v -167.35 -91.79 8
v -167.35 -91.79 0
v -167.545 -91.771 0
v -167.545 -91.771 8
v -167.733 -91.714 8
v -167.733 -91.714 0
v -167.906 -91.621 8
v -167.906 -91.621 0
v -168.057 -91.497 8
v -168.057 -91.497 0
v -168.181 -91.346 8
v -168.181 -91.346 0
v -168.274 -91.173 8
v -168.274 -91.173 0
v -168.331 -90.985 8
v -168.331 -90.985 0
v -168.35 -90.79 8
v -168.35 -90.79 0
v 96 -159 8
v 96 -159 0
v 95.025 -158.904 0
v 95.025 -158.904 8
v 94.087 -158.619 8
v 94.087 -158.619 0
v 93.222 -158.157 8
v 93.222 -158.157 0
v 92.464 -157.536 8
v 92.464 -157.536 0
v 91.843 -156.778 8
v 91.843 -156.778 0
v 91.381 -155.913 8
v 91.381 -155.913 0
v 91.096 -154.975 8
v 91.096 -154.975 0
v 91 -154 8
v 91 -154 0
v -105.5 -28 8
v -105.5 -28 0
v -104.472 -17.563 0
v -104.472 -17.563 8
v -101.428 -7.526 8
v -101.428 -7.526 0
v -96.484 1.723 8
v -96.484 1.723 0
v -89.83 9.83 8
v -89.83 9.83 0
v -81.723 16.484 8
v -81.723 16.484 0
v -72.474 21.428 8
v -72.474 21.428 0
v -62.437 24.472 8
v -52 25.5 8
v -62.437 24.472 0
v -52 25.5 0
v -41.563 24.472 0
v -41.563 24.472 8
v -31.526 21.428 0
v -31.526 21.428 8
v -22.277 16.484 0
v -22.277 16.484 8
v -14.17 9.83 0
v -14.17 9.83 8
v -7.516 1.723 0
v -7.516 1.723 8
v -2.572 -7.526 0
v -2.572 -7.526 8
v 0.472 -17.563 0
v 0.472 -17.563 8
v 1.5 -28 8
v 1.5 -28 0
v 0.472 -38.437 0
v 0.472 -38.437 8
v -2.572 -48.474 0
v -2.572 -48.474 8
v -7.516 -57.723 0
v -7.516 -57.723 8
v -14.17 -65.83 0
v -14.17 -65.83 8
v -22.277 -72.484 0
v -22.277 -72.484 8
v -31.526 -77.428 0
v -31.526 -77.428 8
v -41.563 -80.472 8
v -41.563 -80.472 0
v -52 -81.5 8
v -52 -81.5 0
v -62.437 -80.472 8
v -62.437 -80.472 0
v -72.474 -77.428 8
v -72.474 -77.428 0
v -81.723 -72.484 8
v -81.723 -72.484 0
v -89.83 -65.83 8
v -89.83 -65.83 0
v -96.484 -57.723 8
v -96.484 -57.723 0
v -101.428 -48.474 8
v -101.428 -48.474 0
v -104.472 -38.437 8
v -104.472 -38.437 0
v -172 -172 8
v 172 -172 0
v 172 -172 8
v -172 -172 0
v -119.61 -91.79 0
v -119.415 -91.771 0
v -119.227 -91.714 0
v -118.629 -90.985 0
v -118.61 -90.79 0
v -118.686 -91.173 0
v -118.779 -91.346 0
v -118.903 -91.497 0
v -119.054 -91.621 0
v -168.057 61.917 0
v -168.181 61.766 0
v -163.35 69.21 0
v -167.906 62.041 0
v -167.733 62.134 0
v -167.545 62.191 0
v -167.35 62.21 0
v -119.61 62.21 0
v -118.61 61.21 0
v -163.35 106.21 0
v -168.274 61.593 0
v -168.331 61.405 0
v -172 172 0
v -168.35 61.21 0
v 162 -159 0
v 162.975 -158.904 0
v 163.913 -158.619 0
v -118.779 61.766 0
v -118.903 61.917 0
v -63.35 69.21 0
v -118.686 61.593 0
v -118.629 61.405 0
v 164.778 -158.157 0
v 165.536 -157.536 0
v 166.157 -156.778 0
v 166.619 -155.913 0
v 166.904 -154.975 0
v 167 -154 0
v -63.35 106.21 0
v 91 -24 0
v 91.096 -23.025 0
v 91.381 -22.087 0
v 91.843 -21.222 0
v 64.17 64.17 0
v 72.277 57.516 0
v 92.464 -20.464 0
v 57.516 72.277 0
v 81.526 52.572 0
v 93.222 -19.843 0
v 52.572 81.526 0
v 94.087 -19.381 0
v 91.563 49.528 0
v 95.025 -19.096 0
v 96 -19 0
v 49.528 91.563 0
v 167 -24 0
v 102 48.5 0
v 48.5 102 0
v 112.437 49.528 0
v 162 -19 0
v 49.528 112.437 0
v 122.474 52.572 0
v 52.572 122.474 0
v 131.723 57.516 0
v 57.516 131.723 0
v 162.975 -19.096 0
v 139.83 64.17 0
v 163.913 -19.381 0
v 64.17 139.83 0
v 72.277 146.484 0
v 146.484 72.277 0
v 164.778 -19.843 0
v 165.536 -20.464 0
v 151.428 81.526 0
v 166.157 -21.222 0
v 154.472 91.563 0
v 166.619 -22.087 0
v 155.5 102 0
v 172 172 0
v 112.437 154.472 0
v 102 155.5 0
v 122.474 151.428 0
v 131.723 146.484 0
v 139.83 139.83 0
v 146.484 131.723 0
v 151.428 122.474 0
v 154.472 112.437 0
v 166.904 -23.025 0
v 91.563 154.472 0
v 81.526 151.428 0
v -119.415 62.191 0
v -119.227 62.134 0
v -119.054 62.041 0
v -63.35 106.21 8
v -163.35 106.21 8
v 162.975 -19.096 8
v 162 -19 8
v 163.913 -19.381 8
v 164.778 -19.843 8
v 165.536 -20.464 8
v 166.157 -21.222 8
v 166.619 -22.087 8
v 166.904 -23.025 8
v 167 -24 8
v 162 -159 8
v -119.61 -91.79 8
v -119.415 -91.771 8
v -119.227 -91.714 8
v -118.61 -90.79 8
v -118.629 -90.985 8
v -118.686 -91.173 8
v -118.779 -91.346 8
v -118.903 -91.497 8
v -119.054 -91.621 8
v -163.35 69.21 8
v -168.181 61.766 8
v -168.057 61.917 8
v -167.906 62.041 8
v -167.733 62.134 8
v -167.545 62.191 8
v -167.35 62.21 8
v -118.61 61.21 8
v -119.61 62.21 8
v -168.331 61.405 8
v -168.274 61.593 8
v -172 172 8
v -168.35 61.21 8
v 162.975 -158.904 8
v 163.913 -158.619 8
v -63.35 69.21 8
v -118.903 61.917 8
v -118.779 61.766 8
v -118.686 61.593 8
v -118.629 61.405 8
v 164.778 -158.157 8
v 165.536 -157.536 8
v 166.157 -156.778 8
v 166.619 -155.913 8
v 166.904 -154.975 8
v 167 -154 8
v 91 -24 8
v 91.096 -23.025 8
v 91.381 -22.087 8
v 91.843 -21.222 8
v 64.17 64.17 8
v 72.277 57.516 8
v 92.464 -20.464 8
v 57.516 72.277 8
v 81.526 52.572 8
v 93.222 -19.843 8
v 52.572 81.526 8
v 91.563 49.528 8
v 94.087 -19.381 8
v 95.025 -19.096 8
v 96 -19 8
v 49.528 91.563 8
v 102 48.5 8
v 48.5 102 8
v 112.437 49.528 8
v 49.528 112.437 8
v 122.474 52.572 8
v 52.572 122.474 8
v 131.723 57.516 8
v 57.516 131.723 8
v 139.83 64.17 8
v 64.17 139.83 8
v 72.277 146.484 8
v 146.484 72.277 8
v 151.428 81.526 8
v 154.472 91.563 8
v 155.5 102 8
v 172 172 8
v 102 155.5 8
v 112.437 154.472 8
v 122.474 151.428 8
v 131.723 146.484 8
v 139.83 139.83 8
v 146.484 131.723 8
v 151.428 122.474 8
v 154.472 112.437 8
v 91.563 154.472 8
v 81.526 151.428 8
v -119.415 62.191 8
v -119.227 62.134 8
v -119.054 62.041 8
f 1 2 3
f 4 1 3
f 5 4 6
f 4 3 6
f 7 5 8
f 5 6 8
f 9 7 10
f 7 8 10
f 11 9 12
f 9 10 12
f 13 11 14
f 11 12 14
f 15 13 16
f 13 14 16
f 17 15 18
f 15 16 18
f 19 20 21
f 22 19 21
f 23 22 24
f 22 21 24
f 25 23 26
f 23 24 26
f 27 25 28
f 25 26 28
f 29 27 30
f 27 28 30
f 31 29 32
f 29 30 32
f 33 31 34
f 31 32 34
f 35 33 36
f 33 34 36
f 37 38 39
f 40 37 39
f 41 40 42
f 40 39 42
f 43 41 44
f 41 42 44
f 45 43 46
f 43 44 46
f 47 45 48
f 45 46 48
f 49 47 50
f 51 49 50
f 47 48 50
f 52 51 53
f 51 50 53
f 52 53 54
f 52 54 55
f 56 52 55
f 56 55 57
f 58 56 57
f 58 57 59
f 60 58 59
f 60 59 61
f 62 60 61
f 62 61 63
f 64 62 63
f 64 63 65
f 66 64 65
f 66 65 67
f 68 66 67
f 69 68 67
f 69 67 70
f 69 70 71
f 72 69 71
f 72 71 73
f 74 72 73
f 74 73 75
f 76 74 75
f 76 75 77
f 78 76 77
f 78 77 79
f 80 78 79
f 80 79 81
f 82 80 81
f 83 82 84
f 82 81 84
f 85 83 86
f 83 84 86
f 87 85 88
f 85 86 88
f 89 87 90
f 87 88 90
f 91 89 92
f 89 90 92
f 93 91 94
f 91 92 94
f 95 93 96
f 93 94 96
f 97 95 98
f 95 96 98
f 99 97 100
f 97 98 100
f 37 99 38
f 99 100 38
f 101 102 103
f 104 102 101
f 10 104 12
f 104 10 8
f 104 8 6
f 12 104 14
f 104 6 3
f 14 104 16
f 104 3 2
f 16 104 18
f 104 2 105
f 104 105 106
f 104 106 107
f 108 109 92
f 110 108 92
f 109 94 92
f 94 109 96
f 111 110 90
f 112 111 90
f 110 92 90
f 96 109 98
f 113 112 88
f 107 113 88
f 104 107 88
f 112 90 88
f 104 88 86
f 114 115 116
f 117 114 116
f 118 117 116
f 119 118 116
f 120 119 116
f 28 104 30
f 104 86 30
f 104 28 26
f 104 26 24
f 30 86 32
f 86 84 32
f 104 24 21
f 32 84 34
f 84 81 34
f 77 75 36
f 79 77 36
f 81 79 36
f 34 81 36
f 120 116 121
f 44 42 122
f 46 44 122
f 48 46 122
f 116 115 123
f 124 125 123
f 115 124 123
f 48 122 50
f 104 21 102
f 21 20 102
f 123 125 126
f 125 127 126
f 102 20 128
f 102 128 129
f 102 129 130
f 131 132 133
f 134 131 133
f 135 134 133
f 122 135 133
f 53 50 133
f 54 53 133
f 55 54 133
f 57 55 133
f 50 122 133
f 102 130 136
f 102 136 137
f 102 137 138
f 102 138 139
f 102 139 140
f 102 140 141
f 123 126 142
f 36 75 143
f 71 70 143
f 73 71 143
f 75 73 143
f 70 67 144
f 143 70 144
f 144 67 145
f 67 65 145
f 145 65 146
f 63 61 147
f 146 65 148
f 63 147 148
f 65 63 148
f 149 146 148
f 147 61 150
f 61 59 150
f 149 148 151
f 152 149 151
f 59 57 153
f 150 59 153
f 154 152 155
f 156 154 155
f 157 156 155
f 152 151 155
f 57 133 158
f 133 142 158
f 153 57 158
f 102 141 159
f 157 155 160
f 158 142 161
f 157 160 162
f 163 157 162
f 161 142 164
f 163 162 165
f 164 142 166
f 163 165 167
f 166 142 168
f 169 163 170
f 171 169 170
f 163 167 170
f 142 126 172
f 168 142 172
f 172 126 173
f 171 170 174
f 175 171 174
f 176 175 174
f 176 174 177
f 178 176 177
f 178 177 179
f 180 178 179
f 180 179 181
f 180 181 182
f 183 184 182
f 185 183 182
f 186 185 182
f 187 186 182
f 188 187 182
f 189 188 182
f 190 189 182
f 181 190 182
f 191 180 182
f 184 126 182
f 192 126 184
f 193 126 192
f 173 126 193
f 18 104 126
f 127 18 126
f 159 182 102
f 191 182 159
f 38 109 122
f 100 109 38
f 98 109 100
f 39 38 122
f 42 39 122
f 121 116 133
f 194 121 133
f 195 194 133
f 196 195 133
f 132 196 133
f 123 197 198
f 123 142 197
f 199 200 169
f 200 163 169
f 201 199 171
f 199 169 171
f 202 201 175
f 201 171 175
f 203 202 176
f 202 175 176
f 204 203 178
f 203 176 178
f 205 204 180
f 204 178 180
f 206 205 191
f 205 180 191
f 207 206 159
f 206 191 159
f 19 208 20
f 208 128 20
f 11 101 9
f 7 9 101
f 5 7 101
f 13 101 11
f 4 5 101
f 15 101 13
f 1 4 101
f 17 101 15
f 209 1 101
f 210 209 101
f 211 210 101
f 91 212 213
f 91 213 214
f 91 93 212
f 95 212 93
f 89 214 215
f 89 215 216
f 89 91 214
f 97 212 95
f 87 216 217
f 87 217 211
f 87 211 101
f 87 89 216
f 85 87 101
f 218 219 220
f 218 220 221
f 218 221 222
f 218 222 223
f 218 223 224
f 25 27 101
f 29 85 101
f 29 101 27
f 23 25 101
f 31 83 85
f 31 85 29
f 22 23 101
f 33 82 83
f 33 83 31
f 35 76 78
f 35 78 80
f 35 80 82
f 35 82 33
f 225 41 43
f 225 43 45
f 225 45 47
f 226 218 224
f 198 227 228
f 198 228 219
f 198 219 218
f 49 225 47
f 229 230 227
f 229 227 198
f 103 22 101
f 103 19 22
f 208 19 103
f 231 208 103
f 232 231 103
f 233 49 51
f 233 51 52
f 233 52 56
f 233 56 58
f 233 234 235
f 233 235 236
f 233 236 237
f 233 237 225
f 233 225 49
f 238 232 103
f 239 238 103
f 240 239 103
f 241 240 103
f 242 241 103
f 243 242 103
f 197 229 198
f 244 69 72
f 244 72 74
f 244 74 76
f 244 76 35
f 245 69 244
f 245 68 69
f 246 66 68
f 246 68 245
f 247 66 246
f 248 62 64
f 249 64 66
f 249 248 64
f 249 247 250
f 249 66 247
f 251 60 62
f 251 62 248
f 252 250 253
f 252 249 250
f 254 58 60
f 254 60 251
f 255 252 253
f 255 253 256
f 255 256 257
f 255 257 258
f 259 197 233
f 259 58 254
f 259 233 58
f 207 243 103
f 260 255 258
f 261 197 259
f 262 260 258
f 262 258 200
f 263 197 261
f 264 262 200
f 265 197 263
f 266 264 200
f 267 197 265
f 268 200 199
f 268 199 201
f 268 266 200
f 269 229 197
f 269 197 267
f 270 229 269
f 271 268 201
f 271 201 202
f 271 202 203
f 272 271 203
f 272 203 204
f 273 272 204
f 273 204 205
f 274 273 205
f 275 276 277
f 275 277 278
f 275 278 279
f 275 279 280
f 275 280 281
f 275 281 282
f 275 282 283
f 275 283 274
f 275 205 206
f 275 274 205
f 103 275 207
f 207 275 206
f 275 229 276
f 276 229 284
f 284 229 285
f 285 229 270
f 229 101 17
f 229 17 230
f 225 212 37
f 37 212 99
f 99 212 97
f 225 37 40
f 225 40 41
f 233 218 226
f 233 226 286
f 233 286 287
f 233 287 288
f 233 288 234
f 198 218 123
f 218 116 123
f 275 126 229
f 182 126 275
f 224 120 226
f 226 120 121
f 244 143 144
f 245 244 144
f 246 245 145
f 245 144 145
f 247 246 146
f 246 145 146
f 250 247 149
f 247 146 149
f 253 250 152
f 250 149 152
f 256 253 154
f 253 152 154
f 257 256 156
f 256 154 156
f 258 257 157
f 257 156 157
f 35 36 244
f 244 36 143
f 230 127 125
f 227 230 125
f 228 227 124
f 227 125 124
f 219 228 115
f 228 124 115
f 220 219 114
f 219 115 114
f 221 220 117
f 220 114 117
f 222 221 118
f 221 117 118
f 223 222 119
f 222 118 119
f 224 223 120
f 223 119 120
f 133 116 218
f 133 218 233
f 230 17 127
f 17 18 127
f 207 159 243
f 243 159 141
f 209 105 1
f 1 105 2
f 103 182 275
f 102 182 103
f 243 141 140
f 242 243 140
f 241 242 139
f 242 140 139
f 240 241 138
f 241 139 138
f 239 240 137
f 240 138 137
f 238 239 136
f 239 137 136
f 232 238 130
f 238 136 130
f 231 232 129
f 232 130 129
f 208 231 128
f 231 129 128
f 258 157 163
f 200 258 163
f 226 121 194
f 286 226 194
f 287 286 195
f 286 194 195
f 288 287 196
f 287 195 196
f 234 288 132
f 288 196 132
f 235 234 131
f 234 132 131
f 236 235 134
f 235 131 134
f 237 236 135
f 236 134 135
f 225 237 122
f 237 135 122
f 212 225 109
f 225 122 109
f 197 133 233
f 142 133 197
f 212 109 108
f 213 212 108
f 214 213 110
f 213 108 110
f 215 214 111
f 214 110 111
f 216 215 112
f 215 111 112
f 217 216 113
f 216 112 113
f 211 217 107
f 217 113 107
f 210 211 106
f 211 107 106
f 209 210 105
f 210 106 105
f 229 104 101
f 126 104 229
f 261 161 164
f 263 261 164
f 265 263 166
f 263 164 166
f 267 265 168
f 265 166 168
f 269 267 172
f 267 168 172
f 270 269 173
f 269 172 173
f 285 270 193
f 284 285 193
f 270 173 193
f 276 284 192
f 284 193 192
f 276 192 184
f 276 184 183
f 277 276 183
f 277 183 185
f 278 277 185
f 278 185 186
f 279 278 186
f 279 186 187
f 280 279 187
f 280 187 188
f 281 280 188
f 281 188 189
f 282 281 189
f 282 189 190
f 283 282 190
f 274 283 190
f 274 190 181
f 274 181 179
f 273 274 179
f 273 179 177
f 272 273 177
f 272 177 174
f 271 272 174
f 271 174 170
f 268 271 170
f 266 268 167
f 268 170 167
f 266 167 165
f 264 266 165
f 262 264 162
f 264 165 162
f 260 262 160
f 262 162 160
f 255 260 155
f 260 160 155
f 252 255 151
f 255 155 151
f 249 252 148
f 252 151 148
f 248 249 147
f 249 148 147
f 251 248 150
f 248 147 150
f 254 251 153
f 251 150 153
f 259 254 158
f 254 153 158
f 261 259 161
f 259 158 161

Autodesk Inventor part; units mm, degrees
ref_plane "YZ Plane" through (0, 0, 0) normal (1, 0, 0) x (0, 1, 0)
ref_plane "XZ Plane" through (0, 0, 0) normal (0, 1, 0) x (-1, 0, 0)
ref_plane "XY Plane" through (0, 0, 0) normal (0, 0, 1) x (1, 0, 0)
sketch "Sketch1" plane through (0, 0, 0) normal (0, 0, 1) x (1, 0, 0)
  line L0 (-172, 172) -> (172, 172)
  line L1 (172, 172) -> (172, -172)
  line L2 (172, -172) -> (-172, -172)
  line L3 (-172, -172) -> (-172, 172)
  point P0 (0, 0)
  dimension "d0" = 344
  dimension "d1" = 344
  dimension "d2" = 172
  dimension "d3" = 172
extrude "Extrusion1" add sketch "Sketch1" along normal blind 8
sketch "Sketch3" plane through (0, 0, 0) normal (0, 0, -1) x (-1, 0, 0)
  circle A0 centre (-102, 102) radius 53.5
  circle A1 centre (52, -28) radius 53.5
  circle A2 centre (52, -28) radius 12.5 construction
  circle A3 centre (-102, 102) radius 12.5 construction
  point P0 (0, 0)
  dimension "d18" = 107
  dimension "d19" = 107
extrude "Extrusion2" cut sketch "Sketch3" against normal through all
sketch "Sketch4" plane through (0, 0, 0) normal (0, 0, -1) x (-1, 0, 0)
  line L0 (118.61, 61.21) -> (118.61, -90.79) projected
  line L1 (119.61, -91.79) -> (167.35, -91.79) projected
  line L2 (168.35, -90.79) -> (168.35, 61.21) projected
  line L3 (167.35, 62.21) -> (119.61, 62.21) projected
  line L4 (162, 69.21) -> (63.35, 69.21) projected
  line L5 (63.35, 106.21) -> (162, 106.21) projected
  line L6 (63.35, 69.21) -> (63.35, 106.21) projected
  line L7 (163.35, 69.21) -> (163.35, 106.21) projected
  arc A0 (118.61, -90.79) -> (119.61, -91.79) centre (119.61, -90.79) ccw projected
  arc A1 (167.35, -91.79) -> (168.35, -90.79) centre (167.35, -90.79) ccw projected
  arc A2 (168.35, 61.21) -> (167.35, 62.21) centre (167.35, 61.21) ccw projected
  arc A3 (119.61, 62.21) -> (118.61, 61.21) centre (119.61, 61.21) ccw projected
  line L8 (162, 69.21) -> (163.35, 69.21) projected
  line L9 (163.35, 106.21) -> (162, 106.21) projected
  point P0 (0, 0)
extrude "Extrusion3" cut sketch "Sketch4" against normal through all
sketch "Sketch5" plane through (0, 0, 0) normal (0, 0, -1) x (-1, 0, 0)
  line L0 (-87, -15) -> (-87, -163) construction
  line L1 (-171, -15) -> (-87, -15) construction
  line L2 (-171, -163) -> (-171, -15) construction
  line L3 (-87, -163) -> (-171, -163) construction
  line L4 (-91, -154) -> (-91, -24)
  line L5 (-96, -19) -> (-162, -19)
  line L6 (-167, -24) -> (-167, -154)
  line L7 (-162, -159) -> (-96, -159)
  arc A0 (-96, -159) -> (-91, -154) centre (-96, -154) ccw
  arc A1 (-167, -154) -> (-162, -159) centre (-162, -154) ccw
  arc A2 (-162, -19) -> (-167, -24) centre (-162, -24) ccw
  arc A3 (-91, -24) -> (-96, -19) centre (-96, -24) ccw
  point P0 (0, 0)
  dimension "d20" = 4
  dimension "d21" = 5
extrude "Extrusion4" cut sketch "Sketch5" against normal through all
equation "\"d0\" = edge_length - 2 * wall_width"
equation "\"d1\" = edge_length - 2 * wall_width"
equation "\"d2\" = -wall_width + 0.5 * edge_length"
equation "\"d3\" = -wall_width + 0.5 * edge_length"
equation "\"d4\" = wall_width_small"
equation "\"edge_length\" = 360"
equation "\"wall_width\" = 8"
equation "\"wall_width_small\" = 8"
properties part number "Element"
